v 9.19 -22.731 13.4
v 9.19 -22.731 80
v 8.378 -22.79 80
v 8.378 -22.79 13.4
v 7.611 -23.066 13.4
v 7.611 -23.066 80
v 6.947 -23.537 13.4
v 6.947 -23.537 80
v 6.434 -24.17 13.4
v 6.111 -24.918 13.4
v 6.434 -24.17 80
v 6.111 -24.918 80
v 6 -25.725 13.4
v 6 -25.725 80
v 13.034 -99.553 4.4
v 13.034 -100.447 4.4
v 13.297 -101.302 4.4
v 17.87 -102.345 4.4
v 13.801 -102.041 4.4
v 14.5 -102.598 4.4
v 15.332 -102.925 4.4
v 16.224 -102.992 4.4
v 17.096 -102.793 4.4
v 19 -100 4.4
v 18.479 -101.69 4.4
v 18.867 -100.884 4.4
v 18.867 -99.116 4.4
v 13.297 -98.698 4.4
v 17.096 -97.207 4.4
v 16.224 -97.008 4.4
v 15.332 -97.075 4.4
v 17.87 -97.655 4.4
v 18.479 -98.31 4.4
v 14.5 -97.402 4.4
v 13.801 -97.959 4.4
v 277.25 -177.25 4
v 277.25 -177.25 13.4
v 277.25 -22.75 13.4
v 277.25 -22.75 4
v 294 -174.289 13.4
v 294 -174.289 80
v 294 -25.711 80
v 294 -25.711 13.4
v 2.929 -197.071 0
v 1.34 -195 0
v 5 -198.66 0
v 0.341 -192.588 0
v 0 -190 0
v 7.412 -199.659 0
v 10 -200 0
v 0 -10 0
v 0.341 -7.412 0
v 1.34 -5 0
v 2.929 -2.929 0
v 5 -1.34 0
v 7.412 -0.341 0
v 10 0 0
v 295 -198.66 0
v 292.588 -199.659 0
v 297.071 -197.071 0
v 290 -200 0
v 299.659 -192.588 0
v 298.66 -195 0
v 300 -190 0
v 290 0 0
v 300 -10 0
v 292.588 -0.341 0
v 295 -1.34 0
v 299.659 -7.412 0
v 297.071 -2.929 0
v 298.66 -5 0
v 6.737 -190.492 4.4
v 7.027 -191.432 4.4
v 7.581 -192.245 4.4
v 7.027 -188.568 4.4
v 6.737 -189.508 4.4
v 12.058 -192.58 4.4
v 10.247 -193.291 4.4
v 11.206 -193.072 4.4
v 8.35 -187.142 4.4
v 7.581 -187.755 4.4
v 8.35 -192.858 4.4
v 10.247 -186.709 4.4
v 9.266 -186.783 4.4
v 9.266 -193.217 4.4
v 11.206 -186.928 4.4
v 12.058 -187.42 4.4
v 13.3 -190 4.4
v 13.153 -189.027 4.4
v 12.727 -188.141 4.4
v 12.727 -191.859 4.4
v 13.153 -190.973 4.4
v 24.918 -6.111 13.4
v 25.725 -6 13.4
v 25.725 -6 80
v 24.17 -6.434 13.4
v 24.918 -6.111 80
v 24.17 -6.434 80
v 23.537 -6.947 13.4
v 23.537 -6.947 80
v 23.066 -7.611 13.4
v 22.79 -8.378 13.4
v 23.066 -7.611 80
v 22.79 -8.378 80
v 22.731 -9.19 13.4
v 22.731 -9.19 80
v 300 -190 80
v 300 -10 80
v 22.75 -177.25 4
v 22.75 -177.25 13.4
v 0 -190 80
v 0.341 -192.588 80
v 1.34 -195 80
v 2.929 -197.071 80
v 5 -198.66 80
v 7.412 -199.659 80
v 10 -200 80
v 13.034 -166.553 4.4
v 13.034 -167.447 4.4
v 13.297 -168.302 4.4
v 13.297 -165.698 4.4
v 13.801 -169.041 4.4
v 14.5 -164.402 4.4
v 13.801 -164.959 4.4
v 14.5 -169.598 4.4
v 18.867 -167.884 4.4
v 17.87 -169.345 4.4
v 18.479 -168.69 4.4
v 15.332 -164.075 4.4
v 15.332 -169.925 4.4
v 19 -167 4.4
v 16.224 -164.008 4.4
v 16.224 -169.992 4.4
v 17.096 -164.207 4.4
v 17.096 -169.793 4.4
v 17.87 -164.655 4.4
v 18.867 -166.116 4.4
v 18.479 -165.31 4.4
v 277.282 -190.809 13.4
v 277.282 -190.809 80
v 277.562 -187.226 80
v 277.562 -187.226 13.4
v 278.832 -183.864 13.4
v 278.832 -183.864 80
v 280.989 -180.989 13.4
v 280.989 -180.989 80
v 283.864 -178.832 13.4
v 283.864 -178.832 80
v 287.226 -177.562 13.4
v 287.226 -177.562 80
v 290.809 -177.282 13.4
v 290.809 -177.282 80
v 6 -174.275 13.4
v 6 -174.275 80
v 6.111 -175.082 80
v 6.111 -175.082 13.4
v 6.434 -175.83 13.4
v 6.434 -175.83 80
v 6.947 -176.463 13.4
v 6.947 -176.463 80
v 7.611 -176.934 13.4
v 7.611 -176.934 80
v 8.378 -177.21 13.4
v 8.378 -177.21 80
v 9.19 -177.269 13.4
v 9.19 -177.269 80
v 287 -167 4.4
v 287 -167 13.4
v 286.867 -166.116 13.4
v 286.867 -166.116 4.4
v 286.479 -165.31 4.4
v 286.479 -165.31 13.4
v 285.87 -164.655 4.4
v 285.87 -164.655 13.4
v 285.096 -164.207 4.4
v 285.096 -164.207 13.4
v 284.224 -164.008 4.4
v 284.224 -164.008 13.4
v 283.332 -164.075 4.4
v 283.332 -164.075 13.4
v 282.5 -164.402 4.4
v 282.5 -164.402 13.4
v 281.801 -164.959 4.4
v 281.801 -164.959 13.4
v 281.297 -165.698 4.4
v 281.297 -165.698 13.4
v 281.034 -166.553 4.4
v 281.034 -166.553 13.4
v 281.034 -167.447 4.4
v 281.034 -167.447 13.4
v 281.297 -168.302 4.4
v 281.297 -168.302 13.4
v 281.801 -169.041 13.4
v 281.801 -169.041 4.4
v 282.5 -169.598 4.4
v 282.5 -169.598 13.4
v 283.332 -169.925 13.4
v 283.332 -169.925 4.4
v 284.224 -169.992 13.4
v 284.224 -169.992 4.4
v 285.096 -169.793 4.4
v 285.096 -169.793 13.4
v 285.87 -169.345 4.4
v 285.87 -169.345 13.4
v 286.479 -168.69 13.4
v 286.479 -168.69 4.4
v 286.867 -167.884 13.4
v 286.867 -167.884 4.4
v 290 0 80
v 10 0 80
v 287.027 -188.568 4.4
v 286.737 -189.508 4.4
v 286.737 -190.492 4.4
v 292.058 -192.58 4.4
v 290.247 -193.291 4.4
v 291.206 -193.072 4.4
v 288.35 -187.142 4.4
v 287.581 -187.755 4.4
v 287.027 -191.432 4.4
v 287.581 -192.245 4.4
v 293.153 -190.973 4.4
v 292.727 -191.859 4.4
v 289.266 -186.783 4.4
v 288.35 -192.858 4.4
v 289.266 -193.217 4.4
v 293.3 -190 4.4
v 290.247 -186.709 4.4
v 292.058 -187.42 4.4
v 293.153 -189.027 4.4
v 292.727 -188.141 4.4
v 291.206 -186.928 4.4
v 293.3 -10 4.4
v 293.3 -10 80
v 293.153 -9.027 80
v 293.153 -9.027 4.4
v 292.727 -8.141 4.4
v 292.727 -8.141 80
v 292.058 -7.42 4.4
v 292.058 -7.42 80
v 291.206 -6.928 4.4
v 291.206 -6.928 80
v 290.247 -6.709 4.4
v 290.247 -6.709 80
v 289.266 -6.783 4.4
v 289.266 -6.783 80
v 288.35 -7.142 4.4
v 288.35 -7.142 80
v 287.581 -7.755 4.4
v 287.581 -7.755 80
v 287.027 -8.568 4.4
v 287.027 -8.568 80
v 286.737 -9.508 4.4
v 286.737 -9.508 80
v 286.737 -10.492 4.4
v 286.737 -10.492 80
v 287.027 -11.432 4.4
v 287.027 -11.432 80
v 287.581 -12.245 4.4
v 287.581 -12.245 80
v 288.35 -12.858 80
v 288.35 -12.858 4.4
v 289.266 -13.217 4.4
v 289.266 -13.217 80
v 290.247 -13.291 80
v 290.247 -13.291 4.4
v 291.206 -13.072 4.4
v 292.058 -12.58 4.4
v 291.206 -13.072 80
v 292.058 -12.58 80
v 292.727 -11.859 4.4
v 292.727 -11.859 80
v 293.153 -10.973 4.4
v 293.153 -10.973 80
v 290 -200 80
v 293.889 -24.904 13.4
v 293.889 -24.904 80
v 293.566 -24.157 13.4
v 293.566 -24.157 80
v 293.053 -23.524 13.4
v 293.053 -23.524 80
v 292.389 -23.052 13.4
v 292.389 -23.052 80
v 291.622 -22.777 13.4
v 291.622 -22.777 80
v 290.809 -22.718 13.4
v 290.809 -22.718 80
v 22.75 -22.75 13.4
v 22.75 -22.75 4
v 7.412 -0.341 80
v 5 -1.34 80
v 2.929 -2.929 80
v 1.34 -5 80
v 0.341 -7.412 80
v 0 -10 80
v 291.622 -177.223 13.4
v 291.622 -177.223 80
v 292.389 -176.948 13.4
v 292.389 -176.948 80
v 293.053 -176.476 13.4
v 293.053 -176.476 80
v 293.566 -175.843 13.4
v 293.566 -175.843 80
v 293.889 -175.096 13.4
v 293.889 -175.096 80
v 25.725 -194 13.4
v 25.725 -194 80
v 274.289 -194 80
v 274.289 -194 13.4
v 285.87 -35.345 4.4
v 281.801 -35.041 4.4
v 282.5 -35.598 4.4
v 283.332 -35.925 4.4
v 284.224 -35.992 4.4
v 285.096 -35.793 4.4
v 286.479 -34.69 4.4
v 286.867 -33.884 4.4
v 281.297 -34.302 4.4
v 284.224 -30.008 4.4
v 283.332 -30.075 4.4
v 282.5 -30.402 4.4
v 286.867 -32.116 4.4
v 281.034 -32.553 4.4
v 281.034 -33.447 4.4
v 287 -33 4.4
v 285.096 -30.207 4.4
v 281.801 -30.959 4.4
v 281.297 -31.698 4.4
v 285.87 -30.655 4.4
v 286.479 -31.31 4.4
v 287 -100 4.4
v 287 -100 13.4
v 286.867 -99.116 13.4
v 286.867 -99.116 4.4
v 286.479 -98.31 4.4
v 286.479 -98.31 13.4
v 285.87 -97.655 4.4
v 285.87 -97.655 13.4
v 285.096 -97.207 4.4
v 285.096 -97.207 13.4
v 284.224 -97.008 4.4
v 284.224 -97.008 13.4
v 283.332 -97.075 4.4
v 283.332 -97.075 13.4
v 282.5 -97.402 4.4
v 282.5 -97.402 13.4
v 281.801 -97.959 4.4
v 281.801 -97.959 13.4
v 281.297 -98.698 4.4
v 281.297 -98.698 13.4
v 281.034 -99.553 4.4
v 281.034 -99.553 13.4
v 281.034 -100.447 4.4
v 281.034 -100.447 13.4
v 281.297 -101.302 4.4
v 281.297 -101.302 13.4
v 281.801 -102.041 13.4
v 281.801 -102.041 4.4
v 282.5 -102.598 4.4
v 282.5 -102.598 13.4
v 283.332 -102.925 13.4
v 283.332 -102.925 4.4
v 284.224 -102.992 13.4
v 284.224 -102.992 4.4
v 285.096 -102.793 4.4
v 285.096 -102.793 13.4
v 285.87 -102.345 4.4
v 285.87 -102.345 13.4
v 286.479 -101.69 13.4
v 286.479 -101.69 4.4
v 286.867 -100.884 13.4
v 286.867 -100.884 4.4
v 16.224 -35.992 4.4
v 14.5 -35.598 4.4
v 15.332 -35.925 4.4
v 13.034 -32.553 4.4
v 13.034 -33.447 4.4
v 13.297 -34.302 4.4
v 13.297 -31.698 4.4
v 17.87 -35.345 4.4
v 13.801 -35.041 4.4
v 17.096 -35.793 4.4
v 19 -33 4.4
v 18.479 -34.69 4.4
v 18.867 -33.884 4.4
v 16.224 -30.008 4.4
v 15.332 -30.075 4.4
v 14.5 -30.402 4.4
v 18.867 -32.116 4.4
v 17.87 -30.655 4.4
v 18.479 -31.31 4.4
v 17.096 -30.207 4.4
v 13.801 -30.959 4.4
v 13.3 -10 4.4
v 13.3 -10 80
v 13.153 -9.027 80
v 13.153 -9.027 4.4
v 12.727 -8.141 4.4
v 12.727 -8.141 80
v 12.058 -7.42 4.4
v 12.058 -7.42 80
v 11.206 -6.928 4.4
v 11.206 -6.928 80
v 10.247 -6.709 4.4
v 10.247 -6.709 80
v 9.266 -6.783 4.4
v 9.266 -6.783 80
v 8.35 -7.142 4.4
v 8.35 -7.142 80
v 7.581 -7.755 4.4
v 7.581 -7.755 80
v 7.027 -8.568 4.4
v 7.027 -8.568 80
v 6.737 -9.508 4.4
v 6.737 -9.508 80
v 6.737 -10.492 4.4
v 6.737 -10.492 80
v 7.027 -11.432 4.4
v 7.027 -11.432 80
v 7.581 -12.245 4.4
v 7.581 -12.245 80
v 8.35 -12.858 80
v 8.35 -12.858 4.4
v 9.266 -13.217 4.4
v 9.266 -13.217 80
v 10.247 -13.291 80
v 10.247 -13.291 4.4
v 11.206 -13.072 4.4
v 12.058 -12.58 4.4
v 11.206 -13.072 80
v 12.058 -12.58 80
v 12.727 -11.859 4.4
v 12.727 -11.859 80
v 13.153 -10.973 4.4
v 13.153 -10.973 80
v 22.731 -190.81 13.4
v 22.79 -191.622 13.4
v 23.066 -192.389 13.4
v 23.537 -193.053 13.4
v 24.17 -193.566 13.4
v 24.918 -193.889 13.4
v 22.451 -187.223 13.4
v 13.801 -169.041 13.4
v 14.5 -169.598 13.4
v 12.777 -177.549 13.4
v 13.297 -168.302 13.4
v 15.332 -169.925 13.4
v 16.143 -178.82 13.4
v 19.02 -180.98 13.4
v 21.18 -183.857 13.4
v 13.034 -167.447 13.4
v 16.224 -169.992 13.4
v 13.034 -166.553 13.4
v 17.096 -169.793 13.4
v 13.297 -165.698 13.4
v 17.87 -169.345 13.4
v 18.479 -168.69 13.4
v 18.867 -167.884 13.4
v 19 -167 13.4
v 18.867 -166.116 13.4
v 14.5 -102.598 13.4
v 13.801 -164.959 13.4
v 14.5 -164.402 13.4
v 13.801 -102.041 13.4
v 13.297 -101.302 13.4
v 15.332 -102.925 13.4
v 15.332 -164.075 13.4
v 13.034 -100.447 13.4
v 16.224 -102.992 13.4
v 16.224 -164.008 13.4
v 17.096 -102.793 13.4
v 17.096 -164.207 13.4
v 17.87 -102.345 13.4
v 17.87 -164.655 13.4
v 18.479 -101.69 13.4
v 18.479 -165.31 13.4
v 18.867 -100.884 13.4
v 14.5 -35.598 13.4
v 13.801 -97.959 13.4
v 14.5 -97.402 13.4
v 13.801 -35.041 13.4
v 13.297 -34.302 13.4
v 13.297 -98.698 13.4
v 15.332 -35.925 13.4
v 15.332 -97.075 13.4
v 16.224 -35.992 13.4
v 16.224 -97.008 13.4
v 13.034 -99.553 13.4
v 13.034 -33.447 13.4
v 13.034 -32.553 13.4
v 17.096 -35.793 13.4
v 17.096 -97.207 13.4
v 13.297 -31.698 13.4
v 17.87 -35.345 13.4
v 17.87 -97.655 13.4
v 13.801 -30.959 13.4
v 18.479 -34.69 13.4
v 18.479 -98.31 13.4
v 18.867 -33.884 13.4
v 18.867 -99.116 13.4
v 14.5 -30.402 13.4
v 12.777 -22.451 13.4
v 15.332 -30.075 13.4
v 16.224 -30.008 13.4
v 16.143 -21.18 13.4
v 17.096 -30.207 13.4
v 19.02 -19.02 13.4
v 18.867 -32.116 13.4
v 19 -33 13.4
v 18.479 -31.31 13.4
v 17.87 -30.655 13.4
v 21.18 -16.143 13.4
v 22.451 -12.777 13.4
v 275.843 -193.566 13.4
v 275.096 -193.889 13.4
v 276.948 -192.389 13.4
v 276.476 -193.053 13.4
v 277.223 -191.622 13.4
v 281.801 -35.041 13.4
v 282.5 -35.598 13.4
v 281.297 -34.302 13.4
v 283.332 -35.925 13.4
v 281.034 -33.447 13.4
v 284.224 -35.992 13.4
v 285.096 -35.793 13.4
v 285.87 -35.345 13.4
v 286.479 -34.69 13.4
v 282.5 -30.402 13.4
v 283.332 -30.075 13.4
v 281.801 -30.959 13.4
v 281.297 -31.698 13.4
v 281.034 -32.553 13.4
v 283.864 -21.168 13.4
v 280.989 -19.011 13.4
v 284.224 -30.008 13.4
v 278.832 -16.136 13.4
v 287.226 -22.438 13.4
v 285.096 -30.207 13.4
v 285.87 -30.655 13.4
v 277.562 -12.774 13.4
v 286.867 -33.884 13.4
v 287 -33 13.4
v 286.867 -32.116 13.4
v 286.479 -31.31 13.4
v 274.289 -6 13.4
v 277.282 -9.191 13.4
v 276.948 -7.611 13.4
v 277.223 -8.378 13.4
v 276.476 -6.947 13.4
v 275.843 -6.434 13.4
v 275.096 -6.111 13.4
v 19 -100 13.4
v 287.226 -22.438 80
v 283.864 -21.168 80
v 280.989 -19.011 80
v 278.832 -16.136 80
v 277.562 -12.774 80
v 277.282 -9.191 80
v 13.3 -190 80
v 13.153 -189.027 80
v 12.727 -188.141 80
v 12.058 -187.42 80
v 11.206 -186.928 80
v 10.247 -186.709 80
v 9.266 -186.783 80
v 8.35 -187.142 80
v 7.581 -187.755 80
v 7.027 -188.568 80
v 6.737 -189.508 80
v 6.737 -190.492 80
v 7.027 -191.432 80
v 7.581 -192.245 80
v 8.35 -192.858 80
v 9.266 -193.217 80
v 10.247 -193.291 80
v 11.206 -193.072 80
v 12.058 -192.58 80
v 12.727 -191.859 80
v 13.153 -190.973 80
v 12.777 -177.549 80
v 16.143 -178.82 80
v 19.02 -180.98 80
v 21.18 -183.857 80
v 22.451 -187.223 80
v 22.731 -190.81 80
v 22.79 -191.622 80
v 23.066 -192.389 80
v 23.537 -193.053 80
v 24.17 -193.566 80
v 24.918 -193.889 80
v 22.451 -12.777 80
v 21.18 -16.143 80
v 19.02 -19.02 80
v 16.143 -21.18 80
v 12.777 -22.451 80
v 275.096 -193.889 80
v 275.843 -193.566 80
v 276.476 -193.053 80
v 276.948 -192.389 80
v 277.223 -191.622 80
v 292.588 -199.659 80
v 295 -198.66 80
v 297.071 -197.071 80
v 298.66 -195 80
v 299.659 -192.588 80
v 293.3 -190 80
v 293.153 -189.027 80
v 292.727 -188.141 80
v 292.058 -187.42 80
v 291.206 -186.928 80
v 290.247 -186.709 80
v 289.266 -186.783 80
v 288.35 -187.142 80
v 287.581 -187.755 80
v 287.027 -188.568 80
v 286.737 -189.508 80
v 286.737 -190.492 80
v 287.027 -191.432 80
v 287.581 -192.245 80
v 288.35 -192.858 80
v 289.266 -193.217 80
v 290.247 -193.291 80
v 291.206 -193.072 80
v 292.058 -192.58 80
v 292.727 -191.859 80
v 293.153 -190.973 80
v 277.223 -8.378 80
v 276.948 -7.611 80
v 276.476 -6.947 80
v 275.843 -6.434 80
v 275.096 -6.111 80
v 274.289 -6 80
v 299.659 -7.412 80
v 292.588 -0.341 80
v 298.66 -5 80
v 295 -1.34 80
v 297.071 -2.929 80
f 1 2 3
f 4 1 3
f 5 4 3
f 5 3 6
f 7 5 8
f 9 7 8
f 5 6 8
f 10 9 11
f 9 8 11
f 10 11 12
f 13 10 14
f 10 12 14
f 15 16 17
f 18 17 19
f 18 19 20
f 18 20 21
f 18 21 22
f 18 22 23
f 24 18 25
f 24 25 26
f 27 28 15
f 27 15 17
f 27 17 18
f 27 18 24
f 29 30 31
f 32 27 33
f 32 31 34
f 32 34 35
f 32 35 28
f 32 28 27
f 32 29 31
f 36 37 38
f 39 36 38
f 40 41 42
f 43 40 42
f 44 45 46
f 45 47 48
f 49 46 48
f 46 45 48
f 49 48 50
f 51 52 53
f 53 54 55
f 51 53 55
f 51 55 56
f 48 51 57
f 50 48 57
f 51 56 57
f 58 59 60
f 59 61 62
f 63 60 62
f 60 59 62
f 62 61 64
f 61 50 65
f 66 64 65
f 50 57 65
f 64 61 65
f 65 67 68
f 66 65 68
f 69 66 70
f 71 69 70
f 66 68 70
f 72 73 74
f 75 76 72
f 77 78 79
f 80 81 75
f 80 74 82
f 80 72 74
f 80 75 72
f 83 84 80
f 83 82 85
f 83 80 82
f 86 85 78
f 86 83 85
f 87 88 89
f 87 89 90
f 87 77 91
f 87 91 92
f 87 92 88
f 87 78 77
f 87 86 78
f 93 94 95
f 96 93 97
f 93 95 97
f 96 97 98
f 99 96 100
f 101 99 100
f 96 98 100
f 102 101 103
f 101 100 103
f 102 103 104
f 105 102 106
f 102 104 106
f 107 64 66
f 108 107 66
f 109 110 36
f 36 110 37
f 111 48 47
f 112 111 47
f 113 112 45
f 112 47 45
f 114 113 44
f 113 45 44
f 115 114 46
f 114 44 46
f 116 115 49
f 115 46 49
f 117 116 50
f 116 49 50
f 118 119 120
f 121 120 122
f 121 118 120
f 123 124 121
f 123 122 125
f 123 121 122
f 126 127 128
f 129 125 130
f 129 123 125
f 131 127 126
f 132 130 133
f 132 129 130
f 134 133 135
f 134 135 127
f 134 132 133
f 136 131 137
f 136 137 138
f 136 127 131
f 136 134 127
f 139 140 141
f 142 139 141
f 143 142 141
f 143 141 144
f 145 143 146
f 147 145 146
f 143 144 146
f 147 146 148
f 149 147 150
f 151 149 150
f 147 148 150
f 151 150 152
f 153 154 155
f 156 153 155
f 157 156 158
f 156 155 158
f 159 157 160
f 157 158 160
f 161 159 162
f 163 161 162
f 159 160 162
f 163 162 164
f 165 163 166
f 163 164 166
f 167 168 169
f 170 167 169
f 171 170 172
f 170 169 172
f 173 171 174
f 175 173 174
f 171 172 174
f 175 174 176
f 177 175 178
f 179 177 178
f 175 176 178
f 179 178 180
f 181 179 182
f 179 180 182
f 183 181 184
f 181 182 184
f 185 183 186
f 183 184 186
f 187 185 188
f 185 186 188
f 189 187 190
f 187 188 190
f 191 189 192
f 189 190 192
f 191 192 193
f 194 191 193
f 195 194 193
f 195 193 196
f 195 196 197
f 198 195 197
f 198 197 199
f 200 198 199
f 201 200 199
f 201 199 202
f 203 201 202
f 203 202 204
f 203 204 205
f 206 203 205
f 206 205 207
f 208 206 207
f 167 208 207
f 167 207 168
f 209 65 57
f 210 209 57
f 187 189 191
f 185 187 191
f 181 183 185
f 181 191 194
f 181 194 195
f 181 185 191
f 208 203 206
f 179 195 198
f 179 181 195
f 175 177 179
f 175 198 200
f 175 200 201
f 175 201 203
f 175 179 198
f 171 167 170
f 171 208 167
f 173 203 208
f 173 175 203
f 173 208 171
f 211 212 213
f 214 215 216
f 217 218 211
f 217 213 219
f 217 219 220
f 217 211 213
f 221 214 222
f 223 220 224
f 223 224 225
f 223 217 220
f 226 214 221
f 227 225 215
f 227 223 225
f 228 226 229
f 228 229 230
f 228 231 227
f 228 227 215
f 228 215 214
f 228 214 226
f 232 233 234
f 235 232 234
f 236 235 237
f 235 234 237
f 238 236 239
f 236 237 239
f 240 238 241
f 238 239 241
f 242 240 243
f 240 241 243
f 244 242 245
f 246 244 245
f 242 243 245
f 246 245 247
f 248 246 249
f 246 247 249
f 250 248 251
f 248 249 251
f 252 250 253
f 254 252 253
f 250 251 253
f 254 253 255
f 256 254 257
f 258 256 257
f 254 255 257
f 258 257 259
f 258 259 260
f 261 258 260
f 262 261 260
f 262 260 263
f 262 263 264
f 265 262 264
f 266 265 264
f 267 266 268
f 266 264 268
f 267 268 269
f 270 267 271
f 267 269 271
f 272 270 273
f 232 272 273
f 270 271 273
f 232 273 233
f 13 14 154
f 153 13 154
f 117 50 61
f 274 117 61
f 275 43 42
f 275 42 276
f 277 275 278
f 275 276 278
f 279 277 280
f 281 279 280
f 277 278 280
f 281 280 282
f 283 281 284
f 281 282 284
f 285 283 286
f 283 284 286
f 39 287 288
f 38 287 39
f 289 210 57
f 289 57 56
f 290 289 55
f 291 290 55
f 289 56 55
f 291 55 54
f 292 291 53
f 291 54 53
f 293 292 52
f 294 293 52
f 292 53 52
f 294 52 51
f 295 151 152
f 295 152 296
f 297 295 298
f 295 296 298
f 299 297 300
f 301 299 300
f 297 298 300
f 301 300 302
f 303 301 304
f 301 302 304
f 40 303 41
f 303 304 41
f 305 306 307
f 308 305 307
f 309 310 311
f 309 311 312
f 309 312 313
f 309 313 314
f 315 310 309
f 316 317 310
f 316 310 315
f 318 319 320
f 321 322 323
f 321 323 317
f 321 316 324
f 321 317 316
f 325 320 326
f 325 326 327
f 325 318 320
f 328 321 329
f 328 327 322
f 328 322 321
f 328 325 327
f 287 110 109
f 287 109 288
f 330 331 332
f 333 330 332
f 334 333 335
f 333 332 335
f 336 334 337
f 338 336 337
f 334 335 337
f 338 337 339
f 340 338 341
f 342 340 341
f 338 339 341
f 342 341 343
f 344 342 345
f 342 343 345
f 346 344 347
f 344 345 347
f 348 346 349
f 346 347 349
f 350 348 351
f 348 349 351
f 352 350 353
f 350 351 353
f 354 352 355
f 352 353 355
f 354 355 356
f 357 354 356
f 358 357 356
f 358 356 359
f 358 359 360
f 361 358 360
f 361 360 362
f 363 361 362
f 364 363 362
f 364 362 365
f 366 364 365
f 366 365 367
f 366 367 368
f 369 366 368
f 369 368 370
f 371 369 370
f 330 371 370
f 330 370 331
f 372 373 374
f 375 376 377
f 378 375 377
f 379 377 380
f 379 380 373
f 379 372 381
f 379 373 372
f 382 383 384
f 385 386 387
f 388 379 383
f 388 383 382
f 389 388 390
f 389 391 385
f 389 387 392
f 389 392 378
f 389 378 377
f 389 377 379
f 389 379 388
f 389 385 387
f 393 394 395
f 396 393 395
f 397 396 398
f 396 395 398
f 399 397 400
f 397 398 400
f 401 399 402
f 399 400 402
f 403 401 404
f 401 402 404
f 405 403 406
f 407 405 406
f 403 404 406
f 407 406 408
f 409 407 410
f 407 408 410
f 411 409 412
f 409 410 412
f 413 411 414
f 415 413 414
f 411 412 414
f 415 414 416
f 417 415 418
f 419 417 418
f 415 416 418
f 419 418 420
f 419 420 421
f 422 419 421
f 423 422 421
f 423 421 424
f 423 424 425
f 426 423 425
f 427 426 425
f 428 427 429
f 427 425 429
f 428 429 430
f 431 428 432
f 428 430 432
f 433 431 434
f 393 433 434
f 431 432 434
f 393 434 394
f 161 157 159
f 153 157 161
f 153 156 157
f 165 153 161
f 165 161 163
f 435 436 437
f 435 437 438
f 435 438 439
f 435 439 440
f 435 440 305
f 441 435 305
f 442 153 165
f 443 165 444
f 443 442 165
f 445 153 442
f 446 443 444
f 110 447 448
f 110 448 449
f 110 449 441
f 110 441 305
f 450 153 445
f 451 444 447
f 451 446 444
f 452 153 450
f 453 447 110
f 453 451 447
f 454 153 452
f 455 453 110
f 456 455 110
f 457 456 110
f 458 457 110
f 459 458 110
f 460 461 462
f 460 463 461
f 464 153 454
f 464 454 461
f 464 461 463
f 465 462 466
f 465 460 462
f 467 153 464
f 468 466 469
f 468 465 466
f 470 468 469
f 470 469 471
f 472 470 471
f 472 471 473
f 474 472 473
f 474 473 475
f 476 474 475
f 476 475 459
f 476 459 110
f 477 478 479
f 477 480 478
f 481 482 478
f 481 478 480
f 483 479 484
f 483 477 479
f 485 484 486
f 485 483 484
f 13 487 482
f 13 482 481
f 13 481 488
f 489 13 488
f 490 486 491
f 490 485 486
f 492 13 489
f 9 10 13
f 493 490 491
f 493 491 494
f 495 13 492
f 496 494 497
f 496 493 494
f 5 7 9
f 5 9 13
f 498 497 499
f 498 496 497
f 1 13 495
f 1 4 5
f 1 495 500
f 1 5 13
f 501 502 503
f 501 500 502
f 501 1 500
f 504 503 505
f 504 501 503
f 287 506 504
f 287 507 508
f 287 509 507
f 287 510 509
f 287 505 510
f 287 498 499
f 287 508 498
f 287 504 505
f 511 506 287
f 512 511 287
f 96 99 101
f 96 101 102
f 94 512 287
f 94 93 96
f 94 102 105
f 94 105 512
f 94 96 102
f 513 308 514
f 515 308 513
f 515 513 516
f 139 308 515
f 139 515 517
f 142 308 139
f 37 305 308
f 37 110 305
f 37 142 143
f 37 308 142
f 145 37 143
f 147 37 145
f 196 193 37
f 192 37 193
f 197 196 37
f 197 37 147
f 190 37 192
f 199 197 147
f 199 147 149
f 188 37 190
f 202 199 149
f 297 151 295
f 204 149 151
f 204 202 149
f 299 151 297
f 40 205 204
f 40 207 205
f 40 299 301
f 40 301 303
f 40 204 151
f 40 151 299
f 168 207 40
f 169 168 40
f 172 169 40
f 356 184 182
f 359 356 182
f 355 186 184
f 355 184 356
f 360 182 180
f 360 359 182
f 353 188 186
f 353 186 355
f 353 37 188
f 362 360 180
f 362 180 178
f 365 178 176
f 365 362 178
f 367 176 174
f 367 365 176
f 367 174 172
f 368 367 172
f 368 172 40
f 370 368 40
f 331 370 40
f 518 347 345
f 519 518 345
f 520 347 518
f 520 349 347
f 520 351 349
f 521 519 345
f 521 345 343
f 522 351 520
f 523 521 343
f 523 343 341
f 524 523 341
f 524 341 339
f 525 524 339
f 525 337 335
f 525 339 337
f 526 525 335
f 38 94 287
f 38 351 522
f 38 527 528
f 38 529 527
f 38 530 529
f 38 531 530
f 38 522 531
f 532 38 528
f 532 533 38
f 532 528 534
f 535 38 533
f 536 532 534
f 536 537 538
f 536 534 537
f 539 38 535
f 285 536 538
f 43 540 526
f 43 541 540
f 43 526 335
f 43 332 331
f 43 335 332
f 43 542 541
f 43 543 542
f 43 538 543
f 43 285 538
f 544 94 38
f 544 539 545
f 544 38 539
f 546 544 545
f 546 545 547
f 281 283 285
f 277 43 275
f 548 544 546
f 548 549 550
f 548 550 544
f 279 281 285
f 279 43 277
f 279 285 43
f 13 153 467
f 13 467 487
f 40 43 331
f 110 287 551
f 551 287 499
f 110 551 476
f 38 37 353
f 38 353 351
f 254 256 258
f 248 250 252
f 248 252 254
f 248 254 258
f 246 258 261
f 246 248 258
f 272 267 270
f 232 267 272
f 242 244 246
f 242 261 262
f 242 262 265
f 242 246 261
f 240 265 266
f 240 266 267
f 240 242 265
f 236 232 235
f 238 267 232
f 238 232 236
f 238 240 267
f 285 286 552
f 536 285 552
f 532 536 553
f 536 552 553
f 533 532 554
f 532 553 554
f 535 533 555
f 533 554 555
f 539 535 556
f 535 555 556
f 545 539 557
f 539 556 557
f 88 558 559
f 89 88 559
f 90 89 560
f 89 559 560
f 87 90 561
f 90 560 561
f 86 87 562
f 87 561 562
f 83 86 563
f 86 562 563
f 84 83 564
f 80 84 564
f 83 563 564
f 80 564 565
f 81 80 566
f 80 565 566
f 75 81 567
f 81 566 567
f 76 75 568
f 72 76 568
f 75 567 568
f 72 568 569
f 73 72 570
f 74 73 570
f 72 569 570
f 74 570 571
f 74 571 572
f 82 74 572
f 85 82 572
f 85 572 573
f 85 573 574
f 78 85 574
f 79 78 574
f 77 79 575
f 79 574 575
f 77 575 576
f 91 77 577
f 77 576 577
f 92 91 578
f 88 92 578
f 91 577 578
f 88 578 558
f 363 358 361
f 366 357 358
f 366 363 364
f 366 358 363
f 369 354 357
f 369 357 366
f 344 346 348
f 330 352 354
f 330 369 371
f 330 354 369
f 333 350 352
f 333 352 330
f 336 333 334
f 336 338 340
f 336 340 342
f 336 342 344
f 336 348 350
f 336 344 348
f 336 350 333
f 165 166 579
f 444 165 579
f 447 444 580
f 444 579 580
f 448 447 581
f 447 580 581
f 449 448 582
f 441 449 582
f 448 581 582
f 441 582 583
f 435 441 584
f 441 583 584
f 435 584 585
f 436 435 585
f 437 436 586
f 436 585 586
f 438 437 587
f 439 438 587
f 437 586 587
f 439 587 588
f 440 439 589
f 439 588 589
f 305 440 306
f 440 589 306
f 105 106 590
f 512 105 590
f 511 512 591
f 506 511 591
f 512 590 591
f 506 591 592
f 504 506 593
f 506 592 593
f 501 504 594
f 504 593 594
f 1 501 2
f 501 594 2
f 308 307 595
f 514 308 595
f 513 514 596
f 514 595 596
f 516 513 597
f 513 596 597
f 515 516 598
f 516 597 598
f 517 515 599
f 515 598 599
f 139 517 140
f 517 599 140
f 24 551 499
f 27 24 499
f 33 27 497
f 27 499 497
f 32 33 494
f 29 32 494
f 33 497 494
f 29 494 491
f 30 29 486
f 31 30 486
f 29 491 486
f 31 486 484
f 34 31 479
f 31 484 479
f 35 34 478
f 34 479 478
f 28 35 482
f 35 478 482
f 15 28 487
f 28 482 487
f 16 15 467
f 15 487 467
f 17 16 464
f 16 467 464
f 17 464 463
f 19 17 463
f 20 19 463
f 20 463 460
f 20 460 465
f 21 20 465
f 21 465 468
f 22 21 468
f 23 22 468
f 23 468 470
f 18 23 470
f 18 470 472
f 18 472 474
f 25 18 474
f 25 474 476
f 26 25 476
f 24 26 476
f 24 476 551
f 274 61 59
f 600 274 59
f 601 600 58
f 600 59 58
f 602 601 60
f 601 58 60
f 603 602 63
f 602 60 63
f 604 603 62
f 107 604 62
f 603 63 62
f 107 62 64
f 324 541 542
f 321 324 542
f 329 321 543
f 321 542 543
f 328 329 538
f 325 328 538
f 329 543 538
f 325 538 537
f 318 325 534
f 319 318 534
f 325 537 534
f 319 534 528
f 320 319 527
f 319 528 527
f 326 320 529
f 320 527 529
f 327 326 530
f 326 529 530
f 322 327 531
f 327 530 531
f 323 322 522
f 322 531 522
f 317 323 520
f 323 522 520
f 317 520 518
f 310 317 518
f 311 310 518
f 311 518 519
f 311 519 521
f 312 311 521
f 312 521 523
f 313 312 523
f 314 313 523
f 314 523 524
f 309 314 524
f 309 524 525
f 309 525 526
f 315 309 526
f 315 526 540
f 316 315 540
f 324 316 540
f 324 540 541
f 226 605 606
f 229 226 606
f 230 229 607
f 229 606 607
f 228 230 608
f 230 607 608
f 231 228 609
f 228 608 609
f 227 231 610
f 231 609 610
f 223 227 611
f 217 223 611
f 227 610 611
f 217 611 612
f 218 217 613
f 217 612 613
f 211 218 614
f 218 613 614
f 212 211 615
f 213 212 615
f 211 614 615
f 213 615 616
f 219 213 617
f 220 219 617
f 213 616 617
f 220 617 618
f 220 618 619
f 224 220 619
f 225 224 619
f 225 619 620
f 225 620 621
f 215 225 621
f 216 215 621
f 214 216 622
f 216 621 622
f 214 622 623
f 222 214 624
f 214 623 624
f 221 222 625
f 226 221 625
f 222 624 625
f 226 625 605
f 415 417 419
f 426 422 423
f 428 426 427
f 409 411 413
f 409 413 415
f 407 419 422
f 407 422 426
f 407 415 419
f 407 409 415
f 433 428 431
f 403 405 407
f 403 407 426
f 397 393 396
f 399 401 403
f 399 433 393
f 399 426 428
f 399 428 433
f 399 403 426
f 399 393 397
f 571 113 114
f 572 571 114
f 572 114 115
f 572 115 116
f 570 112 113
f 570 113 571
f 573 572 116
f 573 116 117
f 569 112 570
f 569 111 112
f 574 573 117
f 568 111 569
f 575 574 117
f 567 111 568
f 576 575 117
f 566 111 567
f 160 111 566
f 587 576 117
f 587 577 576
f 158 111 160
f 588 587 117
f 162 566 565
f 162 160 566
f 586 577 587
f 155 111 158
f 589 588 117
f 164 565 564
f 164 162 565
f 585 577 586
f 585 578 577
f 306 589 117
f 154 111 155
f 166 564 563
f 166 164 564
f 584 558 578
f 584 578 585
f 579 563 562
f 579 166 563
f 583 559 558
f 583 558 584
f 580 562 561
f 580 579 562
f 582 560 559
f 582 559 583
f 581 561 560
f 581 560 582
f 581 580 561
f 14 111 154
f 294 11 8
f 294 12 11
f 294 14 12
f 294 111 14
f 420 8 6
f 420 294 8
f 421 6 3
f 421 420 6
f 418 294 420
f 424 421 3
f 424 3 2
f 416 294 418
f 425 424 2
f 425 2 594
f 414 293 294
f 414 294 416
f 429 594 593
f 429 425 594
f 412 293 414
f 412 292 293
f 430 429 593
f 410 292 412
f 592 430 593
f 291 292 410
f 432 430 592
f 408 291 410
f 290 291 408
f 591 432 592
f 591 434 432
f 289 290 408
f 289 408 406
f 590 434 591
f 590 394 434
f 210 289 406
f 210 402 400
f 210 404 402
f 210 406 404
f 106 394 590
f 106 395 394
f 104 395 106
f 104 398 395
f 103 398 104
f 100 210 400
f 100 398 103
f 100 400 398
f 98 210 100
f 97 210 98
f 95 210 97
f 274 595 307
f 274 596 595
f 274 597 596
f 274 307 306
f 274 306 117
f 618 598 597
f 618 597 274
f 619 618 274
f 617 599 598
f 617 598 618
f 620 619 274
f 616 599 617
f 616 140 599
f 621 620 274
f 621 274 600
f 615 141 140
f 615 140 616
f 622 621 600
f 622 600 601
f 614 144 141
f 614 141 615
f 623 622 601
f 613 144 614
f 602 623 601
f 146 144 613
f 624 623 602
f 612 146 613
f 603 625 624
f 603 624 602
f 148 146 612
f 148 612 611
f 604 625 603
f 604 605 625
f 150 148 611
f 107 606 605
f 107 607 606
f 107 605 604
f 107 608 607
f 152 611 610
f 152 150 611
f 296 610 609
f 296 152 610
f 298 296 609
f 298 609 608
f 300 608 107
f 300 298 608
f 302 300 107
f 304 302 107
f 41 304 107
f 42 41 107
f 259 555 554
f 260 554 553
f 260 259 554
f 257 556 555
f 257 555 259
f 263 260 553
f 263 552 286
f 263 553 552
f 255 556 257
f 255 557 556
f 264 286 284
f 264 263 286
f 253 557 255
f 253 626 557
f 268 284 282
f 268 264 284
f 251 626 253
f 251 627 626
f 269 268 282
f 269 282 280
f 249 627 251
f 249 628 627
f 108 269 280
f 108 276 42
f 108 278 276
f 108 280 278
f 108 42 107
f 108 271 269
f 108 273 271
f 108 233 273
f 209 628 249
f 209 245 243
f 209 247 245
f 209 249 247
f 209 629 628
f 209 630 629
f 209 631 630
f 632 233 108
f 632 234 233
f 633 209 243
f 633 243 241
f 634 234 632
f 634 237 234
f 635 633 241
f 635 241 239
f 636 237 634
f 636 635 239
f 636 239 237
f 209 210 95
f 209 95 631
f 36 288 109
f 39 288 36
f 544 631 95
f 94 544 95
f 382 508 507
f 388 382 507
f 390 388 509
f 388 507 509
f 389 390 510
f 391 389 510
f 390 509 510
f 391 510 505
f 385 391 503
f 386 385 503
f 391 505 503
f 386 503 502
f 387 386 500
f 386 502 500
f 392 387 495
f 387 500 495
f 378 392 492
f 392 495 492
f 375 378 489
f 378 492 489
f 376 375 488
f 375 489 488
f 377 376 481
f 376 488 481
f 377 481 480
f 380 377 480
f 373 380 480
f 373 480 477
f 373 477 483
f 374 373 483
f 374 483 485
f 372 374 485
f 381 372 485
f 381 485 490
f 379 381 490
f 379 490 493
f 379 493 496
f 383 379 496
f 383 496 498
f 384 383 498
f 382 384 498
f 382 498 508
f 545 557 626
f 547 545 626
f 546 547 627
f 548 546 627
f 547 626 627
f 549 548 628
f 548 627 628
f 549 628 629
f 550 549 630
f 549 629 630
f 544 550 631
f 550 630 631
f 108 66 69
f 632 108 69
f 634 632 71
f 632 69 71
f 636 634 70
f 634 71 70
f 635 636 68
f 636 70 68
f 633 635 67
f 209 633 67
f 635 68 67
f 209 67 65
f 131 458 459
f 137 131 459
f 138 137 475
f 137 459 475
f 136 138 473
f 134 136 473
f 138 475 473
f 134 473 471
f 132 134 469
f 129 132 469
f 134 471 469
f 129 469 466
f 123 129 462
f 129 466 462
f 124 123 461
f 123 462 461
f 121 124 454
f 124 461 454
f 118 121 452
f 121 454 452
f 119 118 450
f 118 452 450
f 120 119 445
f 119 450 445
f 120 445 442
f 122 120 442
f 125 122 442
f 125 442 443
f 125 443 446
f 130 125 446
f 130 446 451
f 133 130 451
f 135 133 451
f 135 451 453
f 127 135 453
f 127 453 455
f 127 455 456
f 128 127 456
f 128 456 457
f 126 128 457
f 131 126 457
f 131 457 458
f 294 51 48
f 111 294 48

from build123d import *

# Parameters (mm, degrees)
F1_DEPTH = 80
F2_R     = 3.3
F2_R_2   = 3
F3_DEPTH = 75.6
F4_R     = 3
F4_W     = 254.5
F4_H     = 154.5
F5_DEPTH = 66.6
F6_W     = 254.5
F6_H     = 154.5
F7_DEPTH = 9.4


with BuildPart() as f1:
    # F0 (on Top) → F1 (new body)
    with BuildSketch(Plane.XY):
        with BuildLine():
            Line((290, 0), (10, 0))
            ThreePointArc((10, 0), (2.928932, -2.928932), (0, -10))
            Line((0, -10), (0, -190))
            ThreePointArc((0, -190), (2.928932, -197.071068), (10, -200))
            Line((10, -200), (290, -200))
            ThreePointArc((290, -200), (297.071068, -197.071068), (300, -190))
            Line((300, -190), (300, -10))
            ThreePointArc((300, -10), (297.071068, -2.928932), (290, 0))
        make_face()
    extrude(amount=F1_DEPTH)

    # F2 (on face) → F3 (cut)
    with BuildSketch(Plane.XY.offset(80)):
        with Locations((10, -10)):
            Circle(F2_R)
        with Locations((10, -190)):
            Circle(F2_R)
        with Locations((290, -190)):
            Circle(F2_R)
        with Locations((290, -10)):
            Circle(F2_R)
        with Locations((16, -33)):
            Circle(F2_R_2)
        with Locations((16, -100)):
            Circle(F2_R_2)
        with Locations((16, -167)):
            Circle(F2_R_2)
        with Locations((284, -100)):
            Circle(F2_R_2)
        with Locations((284, -33)):
            Circle(F2_R_2)
        with Locations((284, -167)):
            Circle(F2_R_2)
    extrude(amount=-F3_DEPTH, mode=Mode.SUBTRACT)

    # F4 (on face) → F5 (cut)
    with BuildSketch(Plane.XY.offset(80)):
        with BuildLine():
            Line((274.288541, -6), (25.724985, -6))
            ThreePointArc((25.724985, -6), (23.537386, -6.947098), (22.731033, -9.190395))
            ThreePointArc((22.731033, -9.190395), (19.020384, -19.020384), (9.190395, -22.731033))
            ThreePointArc((9.190395, -22.731033), (6.947098, -23.537386), (6, -25.724985))
            Line((6, -25.724985), (6, -174.275015))
            ThreePointArc((6, -174.275015), (6.947098, -176.462614), (9.190395, -177.268967))
            ThreePointArc((9.190395, -177.268967), (19.020384, -180.979616), (22.731033, -190.809605))
            ThreePointArc((22.731033, -190.809605), (23.537386, -193.052902), (25.724985, -194))
            Line((25.724985, -194), (274.288541, -194))
            ThreePointArc((274.288541, -194), (276.476197, -193.052843), (277.282483, -190.809442))
            ThreePointArc((277.282483, -190.809442), (280.989161, -180.989161), (290.809442, -177.282483))
            ThreePointArc((290.809442, -177.282483), (293.052843, -176.476197), (294, -174.288541))
            Line((294, -174.288541), (294, -25.711459))
            ThreePointArc((294, -25.711459), (293.052843, -23.523803), (290.809442, -22.717517))
            ThreePointArc((290.809442, -22.717517), (280.989161, -19.010839), (277.282483, -9.190558))
            ThreePointArc((277.282483, -9.190558), (276.476197, -6.947157), (274.288541, -6))
        make_face()
        with Locations((16, -167)):
            Circle(F4_R, mode=Mode.SUBTRACT)
        with Locations((284, -167)):
            Circle(F4_R, mode=Mode.SUBTRACT)
        with Locations((16, -100)):
            Circle(F4_R, mode=Mode.SUBTRACT)
        with Locations((16, -33)):
            Circle(F4_R, mode=Mode.SUBTRACT)
        with Locations((150.00675, -100)):
            Rectangle(F4_W, F4_H, mode=Mode.SUBTRACT)
        with Locations((284, -100)):
            Circle(F4_R, mode=Mode.SUBTRACT)
        with Locations((284, -33)):
            Circle(F4_R, mode=Mode.SUBTRACT)
        with Locations((150.00675, -100)):
            Rectangle(F4_W, F4_H)
    extrude(amount=-F5_DEPTH, mode=Mode.SUBTRACT)

    # F6 (on face) → F7 (cut)
    with BuildSketch(Plane.XY.offset(13.4)):
        with Locations((150, -100)):
            Rectangle(F6_W, F6_H)
    extrude(amount=-F7_DEPTH, mode=Mode.SUBTRACT)


solid = f1.part
